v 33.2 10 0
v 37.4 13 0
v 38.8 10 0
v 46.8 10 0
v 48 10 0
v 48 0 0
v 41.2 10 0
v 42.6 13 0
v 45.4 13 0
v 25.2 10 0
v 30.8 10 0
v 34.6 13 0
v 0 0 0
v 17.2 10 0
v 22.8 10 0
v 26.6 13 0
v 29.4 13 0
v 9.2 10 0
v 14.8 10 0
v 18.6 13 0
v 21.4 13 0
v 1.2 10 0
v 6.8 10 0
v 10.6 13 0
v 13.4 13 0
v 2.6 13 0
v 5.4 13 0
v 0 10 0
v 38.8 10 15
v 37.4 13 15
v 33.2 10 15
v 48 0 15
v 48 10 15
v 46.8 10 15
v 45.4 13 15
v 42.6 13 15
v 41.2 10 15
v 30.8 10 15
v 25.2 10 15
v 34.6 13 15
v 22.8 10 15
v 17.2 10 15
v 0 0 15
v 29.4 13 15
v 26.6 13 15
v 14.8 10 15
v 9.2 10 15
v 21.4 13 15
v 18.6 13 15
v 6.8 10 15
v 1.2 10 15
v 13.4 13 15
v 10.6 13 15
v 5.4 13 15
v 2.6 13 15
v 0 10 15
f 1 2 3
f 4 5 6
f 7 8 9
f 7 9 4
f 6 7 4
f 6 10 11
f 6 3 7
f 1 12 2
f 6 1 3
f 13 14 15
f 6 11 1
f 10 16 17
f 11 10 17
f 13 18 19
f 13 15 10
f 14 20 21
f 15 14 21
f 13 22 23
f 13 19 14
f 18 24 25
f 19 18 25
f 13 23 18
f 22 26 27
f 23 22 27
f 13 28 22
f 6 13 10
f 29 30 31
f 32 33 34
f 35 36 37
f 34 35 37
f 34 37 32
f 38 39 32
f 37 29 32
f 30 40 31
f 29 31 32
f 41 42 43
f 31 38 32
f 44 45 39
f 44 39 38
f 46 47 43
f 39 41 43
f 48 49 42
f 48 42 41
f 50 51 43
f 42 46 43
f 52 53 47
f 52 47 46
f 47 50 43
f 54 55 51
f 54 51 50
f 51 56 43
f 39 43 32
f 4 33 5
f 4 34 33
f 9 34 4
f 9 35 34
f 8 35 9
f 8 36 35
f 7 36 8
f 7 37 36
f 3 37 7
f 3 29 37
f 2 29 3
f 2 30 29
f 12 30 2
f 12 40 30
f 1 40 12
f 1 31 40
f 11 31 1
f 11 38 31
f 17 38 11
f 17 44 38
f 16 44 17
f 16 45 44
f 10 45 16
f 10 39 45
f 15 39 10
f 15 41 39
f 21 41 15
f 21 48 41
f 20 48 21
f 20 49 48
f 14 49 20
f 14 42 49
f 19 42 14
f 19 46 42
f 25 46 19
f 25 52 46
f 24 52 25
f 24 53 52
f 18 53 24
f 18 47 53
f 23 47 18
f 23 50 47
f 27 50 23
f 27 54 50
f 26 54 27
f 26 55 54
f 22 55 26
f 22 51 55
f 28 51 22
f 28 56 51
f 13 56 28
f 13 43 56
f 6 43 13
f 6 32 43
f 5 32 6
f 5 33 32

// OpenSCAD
$fn = 32;

// ----------------------------------------------------------------------
// Gear rack: 6 teeth, pitch 8 mm
// ----------------------------------------------------------------------

// --- parameters (mm) ---
teeth = 6;                // number of teeth
pitch = 8;                // tooth pitch, X
root_w = 5.6;             // tooth width at the root
tip_w = 2.8;              // tooth width at the tip
base_h = 10;              // rack body height, Y
tooth_h = 3;              // tooth height above the body
plate_t = 15;             // rack width, Z (extrusion height)

rack_l = teeth * pitch;  // overall length
total_h = base_h + tooth_h;  // overall height

profile = [[0, 0], [48, 0], [48, 10], [46.8, 10], [45.4, 13], [42.6, 13], [41.2, 10], [38.8, 10], [37.4, 13], [34.6, 13], [33.2, 10], [30.8, 10], [29.4, 13], [26.6, 13], [25.2, 10], [22.8, 10], [21.4, 13], [18.6, 13], [17.2, 10], [14.8, 10], [13.4, 13], [10.6, 13], [9.2, 10], [6.8, 10], [5.4, 13], [2.6, 13], [1.2, 10], [0, 10]];  // primary outline, 28 points, counter clockwise

// --- the one profile operation ---
linear_extrude(height = plate_t) polygon(points = profile);
